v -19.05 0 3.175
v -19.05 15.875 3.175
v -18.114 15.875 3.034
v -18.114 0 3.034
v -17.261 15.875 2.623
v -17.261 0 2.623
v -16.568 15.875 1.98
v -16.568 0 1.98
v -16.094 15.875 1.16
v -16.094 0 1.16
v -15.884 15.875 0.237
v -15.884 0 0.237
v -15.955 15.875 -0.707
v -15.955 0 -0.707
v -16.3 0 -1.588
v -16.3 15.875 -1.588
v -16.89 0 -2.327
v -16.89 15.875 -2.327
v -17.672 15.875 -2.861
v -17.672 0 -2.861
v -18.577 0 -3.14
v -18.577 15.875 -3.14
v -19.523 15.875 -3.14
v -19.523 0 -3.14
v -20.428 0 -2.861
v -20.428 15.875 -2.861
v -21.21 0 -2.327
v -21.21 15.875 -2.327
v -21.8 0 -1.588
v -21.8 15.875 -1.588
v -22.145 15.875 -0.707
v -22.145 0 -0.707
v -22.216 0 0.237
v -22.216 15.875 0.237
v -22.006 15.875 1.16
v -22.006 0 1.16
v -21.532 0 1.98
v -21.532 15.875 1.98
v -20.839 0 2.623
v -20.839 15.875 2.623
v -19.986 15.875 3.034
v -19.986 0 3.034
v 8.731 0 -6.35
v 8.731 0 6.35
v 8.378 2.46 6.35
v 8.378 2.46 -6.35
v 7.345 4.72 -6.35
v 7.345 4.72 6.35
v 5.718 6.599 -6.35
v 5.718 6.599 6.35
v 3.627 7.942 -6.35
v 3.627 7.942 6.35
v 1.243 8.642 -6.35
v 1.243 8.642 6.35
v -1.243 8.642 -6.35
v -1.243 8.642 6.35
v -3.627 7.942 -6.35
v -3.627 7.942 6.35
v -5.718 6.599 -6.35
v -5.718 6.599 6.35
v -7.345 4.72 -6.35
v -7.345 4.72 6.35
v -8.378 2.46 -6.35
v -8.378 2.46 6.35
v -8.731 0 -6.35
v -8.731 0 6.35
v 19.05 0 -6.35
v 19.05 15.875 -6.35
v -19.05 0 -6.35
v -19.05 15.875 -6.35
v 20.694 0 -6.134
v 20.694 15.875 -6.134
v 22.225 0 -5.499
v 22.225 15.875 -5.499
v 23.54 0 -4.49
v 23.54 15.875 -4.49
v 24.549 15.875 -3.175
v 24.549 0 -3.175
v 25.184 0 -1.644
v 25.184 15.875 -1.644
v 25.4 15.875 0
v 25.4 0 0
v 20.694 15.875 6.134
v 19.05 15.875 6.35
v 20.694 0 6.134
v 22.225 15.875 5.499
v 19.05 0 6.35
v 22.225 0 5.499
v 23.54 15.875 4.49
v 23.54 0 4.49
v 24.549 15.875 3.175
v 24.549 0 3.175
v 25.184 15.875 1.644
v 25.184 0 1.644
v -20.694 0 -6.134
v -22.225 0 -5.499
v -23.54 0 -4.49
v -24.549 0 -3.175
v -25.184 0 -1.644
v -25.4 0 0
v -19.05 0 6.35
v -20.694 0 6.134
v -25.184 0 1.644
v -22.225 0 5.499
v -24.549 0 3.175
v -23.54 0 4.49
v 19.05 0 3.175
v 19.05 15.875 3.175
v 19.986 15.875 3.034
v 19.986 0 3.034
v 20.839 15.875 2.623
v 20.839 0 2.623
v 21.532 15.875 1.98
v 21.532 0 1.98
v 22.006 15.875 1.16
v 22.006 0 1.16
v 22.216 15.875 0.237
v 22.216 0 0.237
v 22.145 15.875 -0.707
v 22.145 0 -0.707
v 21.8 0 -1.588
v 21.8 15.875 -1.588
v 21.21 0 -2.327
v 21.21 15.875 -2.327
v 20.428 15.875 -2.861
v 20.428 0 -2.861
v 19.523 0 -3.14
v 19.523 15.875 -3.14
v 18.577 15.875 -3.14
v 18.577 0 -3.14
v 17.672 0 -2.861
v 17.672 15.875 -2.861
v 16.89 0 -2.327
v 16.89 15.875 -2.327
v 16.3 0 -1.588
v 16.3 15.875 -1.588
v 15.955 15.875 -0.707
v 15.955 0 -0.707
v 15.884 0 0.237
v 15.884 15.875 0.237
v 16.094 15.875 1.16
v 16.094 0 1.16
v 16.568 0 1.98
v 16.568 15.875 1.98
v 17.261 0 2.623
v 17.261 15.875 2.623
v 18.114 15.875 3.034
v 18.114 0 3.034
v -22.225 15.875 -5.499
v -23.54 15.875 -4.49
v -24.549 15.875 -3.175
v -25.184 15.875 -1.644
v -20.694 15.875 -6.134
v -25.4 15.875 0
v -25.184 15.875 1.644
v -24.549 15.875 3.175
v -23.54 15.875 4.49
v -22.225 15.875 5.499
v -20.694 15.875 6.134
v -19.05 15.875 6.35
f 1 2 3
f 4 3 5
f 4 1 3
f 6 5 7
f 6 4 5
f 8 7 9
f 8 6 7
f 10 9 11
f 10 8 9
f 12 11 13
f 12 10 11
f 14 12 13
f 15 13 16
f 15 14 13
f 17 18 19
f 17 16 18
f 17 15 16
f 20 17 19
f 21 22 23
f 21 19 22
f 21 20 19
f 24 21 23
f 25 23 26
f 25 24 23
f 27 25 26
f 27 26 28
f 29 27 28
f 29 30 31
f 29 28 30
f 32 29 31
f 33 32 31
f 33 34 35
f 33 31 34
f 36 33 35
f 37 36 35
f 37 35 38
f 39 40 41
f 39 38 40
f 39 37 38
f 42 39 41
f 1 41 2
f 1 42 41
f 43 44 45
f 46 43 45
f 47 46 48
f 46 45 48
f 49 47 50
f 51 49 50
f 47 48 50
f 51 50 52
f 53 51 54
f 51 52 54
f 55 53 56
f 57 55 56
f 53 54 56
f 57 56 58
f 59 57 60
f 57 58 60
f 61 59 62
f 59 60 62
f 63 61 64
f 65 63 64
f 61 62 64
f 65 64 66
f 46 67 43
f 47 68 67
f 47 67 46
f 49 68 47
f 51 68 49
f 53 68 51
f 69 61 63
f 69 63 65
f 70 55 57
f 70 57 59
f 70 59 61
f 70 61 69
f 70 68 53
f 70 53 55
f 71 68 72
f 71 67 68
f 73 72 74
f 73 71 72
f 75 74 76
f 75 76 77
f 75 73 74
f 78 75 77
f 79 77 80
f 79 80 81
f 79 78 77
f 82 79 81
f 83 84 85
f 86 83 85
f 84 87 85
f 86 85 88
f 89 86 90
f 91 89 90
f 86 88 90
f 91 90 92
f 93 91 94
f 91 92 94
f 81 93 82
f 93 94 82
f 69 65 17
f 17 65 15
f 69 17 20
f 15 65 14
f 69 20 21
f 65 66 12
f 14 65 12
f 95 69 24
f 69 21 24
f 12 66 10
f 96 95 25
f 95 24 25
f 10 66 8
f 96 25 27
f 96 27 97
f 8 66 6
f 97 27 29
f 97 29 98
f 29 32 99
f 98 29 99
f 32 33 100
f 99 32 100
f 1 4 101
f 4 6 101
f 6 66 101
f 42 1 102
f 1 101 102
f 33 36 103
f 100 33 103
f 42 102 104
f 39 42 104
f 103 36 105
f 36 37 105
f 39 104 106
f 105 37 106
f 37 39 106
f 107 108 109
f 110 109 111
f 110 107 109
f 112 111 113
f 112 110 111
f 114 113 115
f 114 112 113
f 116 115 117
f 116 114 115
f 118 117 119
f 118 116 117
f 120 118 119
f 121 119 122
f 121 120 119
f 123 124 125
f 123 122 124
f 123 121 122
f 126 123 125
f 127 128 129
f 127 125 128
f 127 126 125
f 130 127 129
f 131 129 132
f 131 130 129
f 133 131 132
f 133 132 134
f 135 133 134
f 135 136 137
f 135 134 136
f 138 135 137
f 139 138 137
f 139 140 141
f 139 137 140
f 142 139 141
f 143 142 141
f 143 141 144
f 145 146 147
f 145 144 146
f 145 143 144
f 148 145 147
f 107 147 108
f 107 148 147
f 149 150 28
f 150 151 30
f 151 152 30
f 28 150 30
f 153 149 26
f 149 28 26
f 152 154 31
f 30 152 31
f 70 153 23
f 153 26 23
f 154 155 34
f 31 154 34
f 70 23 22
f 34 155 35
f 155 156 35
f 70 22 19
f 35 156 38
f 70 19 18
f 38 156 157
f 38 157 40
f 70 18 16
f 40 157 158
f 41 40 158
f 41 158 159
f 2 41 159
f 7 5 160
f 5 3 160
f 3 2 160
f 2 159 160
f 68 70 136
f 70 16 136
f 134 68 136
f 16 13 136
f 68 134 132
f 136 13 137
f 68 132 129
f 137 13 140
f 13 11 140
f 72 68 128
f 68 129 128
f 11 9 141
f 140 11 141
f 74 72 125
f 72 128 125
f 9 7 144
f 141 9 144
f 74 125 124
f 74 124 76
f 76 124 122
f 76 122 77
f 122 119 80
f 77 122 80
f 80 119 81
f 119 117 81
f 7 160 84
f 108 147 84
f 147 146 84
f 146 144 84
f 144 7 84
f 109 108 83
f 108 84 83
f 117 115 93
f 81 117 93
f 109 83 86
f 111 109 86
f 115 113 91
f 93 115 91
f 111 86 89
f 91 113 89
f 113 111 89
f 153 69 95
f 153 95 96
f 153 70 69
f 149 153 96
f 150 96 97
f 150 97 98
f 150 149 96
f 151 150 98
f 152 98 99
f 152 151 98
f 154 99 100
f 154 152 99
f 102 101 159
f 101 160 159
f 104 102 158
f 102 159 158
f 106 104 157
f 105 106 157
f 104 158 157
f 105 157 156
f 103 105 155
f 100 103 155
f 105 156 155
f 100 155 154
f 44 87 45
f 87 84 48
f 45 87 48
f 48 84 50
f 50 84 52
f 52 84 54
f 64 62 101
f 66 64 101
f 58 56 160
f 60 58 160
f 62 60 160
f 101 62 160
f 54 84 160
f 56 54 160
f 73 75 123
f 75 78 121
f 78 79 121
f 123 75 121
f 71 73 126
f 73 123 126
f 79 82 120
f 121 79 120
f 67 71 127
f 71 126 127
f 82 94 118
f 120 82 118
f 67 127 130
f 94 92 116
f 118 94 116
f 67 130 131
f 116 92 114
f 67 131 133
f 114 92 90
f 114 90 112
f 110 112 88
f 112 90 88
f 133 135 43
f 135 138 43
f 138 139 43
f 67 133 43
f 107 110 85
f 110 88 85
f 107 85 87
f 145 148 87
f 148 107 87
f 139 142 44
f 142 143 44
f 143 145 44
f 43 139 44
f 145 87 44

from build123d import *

# Parameters (mm, degrees)
BOSS_EXTRUDE1_DEPTH = 6.35
SKETCH2_R           = 3.175
CUT_EXTRUDE1_DEPTH  = 31.618591166
FILLET1_R           = 6.35


with BuildPart() as part:
    # Sketch1 → Boss-Extrude1 (new, symmetric)
    with BuildSketch(Plane.XY):
        with BuildLine():
            Line((-8.73125, 0), (-25.4, 0))
            Line((-25.4, 0), (-25.4, 15.875))
            Line((-25.4, 15.875), (25.4, 15.875))
            Line((25.4, 15.875), (25.4, 0))
            Line((25.4, 0), (8.73125, 0))
            ThreePointArc((8.73125, 0), (0, 8.73125), (-8.73125, 0))
        make_face()
    extrude(amount=BOSS_EXTRUDE1_DEPTH, both=True)

    # Sketch2 → Cut-Extrude1 (cut, through all)
    with BuildSketch(Plane(origin=(0, 0, 0), x_dir=(1, 0, 0), z_dir=(0, 1, 0))):
        with Locations(Location((-19.05, 0, 0), (0, 0, 270))):
            Circle(SKETCH2_R)
        with Locations(Location((19.05, 0, 0), (0, 0, 270))):
            Circle(SKETCH2_R)
    extrude(amount=CUT_EXTRUDE1_DEPTH, mode=Mode.SUBTRACT)

    # Fillet1
    fillet1_edges = [part.edges().sort_by_distance(p)[0] for p in [
        (25.4, 7.9375, -6.35),
        (25.4, 7.9375, 6.35),
        (-25.4, 7.9375, -6.35),
        (-25.4, 7.9375, 6.35),
    ]]
    fillet(fillet1_edges, radius=FILLET1_R - 0.0001)  # a hair under: the kernel refuses the full size


solid = part.part
